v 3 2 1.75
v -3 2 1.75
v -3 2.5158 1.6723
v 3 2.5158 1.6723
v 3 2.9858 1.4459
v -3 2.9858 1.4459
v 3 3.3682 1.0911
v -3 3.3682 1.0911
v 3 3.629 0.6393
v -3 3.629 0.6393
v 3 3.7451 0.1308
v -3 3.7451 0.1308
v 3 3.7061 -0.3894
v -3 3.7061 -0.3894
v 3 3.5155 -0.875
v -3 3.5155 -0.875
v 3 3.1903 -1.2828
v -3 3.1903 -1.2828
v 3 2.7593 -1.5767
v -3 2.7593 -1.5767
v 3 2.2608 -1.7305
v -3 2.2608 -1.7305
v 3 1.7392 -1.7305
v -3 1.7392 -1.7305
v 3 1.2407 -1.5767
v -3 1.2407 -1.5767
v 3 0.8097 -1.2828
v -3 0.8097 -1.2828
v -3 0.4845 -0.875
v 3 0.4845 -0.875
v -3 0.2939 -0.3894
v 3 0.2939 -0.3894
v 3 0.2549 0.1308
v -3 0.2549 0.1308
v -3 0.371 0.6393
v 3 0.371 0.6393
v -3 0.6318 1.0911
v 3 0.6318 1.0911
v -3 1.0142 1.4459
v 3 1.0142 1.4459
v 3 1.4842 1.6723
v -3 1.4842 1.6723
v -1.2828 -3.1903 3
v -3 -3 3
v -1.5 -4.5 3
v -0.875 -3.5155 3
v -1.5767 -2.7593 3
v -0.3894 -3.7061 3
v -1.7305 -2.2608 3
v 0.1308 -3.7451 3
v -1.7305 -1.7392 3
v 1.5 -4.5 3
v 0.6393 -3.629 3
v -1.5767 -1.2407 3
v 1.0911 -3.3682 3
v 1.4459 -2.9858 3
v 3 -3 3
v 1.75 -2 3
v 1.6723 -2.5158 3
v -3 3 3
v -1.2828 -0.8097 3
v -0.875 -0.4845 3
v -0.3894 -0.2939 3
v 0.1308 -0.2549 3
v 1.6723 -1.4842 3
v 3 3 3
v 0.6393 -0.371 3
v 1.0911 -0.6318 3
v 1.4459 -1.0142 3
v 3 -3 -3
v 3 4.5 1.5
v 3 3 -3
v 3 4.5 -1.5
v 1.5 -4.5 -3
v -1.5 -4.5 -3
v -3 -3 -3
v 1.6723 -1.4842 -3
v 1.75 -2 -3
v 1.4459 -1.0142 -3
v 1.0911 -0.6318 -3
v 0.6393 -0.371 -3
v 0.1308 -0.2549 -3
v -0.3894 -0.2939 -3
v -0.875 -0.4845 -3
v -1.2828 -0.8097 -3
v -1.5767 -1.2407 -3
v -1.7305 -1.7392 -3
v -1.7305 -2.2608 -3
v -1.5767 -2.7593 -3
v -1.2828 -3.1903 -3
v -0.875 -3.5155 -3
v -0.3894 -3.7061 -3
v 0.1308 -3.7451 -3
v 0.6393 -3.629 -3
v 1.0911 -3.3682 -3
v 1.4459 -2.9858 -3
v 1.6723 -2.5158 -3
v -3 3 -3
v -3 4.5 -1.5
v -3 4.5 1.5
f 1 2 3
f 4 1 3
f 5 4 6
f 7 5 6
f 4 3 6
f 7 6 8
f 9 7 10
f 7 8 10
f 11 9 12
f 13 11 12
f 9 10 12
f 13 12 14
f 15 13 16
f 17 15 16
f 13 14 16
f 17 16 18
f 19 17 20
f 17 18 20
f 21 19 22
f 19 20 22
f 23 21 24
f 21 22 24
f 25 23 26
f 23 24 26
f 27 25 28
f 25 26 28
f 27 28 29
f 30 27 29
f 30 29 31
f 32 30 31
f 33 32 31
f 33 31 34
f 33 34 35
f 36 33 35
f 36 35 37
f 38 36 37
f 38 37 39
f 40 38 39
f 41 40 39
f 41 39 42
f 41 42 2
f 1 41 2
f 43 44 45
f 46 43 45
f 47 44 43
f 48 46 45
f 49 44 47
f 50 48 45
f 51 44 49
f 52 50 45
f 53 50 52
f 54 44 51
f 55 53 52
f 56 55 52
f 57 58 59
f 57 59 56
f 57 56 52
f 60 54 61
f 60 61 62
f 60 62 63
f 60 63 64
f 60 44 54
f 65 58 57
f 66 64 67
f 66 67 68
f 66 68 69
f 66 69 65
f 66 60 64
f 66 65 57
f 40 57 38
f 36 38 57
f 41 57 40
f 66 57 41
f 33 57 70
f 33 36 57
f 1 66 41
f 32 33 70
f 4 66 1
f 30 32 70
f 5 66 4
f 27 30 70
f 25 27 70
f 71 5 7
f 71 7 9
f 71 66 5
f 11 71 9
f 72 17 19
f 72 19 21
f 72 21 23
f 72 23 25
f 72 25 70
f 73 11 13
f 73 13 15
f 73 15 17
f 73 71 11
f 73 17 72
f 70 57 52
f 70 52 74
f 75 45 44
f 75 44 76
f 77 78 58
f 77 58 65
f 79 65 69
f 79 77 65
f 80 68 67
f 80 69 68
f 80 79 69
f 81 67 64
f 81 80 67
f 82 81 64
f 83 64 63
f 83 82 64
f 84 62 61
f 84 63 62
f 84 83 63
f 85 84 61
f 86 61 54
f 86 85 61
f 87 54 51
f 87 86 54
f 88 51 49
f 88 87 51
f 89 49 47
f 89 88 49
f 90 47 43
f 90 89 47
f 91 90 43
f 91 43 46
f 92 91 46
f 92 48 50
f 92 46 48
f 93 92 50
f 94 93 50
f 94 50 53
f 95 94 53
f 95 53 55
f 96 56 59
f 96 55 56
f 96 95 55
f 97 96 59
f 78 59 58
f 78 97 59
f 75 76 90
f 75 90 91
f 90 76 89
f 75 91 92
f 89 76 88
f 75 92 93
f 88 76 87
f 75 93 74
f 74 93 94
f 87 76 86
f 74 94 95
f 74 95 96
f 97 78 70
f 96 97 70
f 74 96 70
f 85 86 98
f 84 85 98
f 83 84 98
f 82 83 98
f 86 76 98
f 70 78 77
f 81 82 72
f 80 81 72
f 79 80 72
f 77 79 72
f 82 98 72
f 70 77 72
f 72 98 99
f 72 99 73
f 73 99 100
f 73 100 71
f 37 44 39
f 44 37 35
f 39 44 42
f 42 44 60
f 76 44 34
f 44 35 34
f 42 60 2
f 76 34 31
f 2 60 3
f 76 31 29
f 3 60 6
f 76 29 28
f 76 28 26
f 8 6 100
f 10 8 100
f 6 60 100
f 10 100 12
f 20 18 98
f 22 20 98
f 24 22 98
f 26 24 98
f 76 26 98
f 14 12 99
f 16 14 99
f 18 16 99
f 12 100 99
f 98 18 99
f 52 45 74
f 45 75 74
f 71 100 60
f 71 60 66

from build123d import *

# Parameters (mm, degrees)
SKETCH1_W               = 6
SKETCH1_H               = 6
BOSS_EXTRUDE1_DEPTH     = 4.5
CUT_EXTRUDE1_DEPTH      = 7.184658438
CUT_EXTRUDE1_DEPTH_BACK = 7.184658438
SKETCH2_R               = 1.75
SKETCH3_R               = 1.75
CUT_EXTRUDE2_DEPTH      = 9.077747211
CHAMFER1_SIZE           = 1.5


with BuildPart() as part:
    # Sketch1 → Boss-Extrude1 (new, symmetric)
    with BuildSketch(Plane(origin=(0, 0, 0), x_dir=(1, 0, 0), z_dir=(0, 1, 0))):
        Rectangle(SKETCH1_W, SKETCH1_H)
    extrude(amount=BOSS_EXTRUDE1_DEPTH, both=True)

    # Sketch2 → Cut-Extrude1 (cut, two sides: drawn at the far end of the back side and taken through both)
    with BuildSketch(Plane.XY.offset(-CUT_EXTRUDE1_DEPTH_BACK)):
        with Locations((0, -2)):
            Circle(SKETCH2_R)
    extrude(amount=CUT_EXTRUDE1_DEPTH + CUT_EXTRUDE1_DEPTH_BACK, mode=Mode.SUBTRACT)

    # Sketch3 → Cut-Extrude2 (cut, through all)
    with BuildSketch(Plane.ZY.offset(3)):
        with Locations((0, 2)):
            Circle(SKETCH3_R)
    extrude(amount=-CUT_EXTRUDE2_DEPTH, mode=Mode.SUBTRACT)

    # Chamfer1
    chamfer1_edges = [part.edges().sort_by_distance(p)[0] for p in [
        (0, 4.5, 3),
        (-3, -4.5, 0),
        (3, -4.5, 0),
        (0, 4.5, -3),
    ]]
    chamfer(chamfer1_edges, length=CHAMFER1_SIZE)


solid = part.part
